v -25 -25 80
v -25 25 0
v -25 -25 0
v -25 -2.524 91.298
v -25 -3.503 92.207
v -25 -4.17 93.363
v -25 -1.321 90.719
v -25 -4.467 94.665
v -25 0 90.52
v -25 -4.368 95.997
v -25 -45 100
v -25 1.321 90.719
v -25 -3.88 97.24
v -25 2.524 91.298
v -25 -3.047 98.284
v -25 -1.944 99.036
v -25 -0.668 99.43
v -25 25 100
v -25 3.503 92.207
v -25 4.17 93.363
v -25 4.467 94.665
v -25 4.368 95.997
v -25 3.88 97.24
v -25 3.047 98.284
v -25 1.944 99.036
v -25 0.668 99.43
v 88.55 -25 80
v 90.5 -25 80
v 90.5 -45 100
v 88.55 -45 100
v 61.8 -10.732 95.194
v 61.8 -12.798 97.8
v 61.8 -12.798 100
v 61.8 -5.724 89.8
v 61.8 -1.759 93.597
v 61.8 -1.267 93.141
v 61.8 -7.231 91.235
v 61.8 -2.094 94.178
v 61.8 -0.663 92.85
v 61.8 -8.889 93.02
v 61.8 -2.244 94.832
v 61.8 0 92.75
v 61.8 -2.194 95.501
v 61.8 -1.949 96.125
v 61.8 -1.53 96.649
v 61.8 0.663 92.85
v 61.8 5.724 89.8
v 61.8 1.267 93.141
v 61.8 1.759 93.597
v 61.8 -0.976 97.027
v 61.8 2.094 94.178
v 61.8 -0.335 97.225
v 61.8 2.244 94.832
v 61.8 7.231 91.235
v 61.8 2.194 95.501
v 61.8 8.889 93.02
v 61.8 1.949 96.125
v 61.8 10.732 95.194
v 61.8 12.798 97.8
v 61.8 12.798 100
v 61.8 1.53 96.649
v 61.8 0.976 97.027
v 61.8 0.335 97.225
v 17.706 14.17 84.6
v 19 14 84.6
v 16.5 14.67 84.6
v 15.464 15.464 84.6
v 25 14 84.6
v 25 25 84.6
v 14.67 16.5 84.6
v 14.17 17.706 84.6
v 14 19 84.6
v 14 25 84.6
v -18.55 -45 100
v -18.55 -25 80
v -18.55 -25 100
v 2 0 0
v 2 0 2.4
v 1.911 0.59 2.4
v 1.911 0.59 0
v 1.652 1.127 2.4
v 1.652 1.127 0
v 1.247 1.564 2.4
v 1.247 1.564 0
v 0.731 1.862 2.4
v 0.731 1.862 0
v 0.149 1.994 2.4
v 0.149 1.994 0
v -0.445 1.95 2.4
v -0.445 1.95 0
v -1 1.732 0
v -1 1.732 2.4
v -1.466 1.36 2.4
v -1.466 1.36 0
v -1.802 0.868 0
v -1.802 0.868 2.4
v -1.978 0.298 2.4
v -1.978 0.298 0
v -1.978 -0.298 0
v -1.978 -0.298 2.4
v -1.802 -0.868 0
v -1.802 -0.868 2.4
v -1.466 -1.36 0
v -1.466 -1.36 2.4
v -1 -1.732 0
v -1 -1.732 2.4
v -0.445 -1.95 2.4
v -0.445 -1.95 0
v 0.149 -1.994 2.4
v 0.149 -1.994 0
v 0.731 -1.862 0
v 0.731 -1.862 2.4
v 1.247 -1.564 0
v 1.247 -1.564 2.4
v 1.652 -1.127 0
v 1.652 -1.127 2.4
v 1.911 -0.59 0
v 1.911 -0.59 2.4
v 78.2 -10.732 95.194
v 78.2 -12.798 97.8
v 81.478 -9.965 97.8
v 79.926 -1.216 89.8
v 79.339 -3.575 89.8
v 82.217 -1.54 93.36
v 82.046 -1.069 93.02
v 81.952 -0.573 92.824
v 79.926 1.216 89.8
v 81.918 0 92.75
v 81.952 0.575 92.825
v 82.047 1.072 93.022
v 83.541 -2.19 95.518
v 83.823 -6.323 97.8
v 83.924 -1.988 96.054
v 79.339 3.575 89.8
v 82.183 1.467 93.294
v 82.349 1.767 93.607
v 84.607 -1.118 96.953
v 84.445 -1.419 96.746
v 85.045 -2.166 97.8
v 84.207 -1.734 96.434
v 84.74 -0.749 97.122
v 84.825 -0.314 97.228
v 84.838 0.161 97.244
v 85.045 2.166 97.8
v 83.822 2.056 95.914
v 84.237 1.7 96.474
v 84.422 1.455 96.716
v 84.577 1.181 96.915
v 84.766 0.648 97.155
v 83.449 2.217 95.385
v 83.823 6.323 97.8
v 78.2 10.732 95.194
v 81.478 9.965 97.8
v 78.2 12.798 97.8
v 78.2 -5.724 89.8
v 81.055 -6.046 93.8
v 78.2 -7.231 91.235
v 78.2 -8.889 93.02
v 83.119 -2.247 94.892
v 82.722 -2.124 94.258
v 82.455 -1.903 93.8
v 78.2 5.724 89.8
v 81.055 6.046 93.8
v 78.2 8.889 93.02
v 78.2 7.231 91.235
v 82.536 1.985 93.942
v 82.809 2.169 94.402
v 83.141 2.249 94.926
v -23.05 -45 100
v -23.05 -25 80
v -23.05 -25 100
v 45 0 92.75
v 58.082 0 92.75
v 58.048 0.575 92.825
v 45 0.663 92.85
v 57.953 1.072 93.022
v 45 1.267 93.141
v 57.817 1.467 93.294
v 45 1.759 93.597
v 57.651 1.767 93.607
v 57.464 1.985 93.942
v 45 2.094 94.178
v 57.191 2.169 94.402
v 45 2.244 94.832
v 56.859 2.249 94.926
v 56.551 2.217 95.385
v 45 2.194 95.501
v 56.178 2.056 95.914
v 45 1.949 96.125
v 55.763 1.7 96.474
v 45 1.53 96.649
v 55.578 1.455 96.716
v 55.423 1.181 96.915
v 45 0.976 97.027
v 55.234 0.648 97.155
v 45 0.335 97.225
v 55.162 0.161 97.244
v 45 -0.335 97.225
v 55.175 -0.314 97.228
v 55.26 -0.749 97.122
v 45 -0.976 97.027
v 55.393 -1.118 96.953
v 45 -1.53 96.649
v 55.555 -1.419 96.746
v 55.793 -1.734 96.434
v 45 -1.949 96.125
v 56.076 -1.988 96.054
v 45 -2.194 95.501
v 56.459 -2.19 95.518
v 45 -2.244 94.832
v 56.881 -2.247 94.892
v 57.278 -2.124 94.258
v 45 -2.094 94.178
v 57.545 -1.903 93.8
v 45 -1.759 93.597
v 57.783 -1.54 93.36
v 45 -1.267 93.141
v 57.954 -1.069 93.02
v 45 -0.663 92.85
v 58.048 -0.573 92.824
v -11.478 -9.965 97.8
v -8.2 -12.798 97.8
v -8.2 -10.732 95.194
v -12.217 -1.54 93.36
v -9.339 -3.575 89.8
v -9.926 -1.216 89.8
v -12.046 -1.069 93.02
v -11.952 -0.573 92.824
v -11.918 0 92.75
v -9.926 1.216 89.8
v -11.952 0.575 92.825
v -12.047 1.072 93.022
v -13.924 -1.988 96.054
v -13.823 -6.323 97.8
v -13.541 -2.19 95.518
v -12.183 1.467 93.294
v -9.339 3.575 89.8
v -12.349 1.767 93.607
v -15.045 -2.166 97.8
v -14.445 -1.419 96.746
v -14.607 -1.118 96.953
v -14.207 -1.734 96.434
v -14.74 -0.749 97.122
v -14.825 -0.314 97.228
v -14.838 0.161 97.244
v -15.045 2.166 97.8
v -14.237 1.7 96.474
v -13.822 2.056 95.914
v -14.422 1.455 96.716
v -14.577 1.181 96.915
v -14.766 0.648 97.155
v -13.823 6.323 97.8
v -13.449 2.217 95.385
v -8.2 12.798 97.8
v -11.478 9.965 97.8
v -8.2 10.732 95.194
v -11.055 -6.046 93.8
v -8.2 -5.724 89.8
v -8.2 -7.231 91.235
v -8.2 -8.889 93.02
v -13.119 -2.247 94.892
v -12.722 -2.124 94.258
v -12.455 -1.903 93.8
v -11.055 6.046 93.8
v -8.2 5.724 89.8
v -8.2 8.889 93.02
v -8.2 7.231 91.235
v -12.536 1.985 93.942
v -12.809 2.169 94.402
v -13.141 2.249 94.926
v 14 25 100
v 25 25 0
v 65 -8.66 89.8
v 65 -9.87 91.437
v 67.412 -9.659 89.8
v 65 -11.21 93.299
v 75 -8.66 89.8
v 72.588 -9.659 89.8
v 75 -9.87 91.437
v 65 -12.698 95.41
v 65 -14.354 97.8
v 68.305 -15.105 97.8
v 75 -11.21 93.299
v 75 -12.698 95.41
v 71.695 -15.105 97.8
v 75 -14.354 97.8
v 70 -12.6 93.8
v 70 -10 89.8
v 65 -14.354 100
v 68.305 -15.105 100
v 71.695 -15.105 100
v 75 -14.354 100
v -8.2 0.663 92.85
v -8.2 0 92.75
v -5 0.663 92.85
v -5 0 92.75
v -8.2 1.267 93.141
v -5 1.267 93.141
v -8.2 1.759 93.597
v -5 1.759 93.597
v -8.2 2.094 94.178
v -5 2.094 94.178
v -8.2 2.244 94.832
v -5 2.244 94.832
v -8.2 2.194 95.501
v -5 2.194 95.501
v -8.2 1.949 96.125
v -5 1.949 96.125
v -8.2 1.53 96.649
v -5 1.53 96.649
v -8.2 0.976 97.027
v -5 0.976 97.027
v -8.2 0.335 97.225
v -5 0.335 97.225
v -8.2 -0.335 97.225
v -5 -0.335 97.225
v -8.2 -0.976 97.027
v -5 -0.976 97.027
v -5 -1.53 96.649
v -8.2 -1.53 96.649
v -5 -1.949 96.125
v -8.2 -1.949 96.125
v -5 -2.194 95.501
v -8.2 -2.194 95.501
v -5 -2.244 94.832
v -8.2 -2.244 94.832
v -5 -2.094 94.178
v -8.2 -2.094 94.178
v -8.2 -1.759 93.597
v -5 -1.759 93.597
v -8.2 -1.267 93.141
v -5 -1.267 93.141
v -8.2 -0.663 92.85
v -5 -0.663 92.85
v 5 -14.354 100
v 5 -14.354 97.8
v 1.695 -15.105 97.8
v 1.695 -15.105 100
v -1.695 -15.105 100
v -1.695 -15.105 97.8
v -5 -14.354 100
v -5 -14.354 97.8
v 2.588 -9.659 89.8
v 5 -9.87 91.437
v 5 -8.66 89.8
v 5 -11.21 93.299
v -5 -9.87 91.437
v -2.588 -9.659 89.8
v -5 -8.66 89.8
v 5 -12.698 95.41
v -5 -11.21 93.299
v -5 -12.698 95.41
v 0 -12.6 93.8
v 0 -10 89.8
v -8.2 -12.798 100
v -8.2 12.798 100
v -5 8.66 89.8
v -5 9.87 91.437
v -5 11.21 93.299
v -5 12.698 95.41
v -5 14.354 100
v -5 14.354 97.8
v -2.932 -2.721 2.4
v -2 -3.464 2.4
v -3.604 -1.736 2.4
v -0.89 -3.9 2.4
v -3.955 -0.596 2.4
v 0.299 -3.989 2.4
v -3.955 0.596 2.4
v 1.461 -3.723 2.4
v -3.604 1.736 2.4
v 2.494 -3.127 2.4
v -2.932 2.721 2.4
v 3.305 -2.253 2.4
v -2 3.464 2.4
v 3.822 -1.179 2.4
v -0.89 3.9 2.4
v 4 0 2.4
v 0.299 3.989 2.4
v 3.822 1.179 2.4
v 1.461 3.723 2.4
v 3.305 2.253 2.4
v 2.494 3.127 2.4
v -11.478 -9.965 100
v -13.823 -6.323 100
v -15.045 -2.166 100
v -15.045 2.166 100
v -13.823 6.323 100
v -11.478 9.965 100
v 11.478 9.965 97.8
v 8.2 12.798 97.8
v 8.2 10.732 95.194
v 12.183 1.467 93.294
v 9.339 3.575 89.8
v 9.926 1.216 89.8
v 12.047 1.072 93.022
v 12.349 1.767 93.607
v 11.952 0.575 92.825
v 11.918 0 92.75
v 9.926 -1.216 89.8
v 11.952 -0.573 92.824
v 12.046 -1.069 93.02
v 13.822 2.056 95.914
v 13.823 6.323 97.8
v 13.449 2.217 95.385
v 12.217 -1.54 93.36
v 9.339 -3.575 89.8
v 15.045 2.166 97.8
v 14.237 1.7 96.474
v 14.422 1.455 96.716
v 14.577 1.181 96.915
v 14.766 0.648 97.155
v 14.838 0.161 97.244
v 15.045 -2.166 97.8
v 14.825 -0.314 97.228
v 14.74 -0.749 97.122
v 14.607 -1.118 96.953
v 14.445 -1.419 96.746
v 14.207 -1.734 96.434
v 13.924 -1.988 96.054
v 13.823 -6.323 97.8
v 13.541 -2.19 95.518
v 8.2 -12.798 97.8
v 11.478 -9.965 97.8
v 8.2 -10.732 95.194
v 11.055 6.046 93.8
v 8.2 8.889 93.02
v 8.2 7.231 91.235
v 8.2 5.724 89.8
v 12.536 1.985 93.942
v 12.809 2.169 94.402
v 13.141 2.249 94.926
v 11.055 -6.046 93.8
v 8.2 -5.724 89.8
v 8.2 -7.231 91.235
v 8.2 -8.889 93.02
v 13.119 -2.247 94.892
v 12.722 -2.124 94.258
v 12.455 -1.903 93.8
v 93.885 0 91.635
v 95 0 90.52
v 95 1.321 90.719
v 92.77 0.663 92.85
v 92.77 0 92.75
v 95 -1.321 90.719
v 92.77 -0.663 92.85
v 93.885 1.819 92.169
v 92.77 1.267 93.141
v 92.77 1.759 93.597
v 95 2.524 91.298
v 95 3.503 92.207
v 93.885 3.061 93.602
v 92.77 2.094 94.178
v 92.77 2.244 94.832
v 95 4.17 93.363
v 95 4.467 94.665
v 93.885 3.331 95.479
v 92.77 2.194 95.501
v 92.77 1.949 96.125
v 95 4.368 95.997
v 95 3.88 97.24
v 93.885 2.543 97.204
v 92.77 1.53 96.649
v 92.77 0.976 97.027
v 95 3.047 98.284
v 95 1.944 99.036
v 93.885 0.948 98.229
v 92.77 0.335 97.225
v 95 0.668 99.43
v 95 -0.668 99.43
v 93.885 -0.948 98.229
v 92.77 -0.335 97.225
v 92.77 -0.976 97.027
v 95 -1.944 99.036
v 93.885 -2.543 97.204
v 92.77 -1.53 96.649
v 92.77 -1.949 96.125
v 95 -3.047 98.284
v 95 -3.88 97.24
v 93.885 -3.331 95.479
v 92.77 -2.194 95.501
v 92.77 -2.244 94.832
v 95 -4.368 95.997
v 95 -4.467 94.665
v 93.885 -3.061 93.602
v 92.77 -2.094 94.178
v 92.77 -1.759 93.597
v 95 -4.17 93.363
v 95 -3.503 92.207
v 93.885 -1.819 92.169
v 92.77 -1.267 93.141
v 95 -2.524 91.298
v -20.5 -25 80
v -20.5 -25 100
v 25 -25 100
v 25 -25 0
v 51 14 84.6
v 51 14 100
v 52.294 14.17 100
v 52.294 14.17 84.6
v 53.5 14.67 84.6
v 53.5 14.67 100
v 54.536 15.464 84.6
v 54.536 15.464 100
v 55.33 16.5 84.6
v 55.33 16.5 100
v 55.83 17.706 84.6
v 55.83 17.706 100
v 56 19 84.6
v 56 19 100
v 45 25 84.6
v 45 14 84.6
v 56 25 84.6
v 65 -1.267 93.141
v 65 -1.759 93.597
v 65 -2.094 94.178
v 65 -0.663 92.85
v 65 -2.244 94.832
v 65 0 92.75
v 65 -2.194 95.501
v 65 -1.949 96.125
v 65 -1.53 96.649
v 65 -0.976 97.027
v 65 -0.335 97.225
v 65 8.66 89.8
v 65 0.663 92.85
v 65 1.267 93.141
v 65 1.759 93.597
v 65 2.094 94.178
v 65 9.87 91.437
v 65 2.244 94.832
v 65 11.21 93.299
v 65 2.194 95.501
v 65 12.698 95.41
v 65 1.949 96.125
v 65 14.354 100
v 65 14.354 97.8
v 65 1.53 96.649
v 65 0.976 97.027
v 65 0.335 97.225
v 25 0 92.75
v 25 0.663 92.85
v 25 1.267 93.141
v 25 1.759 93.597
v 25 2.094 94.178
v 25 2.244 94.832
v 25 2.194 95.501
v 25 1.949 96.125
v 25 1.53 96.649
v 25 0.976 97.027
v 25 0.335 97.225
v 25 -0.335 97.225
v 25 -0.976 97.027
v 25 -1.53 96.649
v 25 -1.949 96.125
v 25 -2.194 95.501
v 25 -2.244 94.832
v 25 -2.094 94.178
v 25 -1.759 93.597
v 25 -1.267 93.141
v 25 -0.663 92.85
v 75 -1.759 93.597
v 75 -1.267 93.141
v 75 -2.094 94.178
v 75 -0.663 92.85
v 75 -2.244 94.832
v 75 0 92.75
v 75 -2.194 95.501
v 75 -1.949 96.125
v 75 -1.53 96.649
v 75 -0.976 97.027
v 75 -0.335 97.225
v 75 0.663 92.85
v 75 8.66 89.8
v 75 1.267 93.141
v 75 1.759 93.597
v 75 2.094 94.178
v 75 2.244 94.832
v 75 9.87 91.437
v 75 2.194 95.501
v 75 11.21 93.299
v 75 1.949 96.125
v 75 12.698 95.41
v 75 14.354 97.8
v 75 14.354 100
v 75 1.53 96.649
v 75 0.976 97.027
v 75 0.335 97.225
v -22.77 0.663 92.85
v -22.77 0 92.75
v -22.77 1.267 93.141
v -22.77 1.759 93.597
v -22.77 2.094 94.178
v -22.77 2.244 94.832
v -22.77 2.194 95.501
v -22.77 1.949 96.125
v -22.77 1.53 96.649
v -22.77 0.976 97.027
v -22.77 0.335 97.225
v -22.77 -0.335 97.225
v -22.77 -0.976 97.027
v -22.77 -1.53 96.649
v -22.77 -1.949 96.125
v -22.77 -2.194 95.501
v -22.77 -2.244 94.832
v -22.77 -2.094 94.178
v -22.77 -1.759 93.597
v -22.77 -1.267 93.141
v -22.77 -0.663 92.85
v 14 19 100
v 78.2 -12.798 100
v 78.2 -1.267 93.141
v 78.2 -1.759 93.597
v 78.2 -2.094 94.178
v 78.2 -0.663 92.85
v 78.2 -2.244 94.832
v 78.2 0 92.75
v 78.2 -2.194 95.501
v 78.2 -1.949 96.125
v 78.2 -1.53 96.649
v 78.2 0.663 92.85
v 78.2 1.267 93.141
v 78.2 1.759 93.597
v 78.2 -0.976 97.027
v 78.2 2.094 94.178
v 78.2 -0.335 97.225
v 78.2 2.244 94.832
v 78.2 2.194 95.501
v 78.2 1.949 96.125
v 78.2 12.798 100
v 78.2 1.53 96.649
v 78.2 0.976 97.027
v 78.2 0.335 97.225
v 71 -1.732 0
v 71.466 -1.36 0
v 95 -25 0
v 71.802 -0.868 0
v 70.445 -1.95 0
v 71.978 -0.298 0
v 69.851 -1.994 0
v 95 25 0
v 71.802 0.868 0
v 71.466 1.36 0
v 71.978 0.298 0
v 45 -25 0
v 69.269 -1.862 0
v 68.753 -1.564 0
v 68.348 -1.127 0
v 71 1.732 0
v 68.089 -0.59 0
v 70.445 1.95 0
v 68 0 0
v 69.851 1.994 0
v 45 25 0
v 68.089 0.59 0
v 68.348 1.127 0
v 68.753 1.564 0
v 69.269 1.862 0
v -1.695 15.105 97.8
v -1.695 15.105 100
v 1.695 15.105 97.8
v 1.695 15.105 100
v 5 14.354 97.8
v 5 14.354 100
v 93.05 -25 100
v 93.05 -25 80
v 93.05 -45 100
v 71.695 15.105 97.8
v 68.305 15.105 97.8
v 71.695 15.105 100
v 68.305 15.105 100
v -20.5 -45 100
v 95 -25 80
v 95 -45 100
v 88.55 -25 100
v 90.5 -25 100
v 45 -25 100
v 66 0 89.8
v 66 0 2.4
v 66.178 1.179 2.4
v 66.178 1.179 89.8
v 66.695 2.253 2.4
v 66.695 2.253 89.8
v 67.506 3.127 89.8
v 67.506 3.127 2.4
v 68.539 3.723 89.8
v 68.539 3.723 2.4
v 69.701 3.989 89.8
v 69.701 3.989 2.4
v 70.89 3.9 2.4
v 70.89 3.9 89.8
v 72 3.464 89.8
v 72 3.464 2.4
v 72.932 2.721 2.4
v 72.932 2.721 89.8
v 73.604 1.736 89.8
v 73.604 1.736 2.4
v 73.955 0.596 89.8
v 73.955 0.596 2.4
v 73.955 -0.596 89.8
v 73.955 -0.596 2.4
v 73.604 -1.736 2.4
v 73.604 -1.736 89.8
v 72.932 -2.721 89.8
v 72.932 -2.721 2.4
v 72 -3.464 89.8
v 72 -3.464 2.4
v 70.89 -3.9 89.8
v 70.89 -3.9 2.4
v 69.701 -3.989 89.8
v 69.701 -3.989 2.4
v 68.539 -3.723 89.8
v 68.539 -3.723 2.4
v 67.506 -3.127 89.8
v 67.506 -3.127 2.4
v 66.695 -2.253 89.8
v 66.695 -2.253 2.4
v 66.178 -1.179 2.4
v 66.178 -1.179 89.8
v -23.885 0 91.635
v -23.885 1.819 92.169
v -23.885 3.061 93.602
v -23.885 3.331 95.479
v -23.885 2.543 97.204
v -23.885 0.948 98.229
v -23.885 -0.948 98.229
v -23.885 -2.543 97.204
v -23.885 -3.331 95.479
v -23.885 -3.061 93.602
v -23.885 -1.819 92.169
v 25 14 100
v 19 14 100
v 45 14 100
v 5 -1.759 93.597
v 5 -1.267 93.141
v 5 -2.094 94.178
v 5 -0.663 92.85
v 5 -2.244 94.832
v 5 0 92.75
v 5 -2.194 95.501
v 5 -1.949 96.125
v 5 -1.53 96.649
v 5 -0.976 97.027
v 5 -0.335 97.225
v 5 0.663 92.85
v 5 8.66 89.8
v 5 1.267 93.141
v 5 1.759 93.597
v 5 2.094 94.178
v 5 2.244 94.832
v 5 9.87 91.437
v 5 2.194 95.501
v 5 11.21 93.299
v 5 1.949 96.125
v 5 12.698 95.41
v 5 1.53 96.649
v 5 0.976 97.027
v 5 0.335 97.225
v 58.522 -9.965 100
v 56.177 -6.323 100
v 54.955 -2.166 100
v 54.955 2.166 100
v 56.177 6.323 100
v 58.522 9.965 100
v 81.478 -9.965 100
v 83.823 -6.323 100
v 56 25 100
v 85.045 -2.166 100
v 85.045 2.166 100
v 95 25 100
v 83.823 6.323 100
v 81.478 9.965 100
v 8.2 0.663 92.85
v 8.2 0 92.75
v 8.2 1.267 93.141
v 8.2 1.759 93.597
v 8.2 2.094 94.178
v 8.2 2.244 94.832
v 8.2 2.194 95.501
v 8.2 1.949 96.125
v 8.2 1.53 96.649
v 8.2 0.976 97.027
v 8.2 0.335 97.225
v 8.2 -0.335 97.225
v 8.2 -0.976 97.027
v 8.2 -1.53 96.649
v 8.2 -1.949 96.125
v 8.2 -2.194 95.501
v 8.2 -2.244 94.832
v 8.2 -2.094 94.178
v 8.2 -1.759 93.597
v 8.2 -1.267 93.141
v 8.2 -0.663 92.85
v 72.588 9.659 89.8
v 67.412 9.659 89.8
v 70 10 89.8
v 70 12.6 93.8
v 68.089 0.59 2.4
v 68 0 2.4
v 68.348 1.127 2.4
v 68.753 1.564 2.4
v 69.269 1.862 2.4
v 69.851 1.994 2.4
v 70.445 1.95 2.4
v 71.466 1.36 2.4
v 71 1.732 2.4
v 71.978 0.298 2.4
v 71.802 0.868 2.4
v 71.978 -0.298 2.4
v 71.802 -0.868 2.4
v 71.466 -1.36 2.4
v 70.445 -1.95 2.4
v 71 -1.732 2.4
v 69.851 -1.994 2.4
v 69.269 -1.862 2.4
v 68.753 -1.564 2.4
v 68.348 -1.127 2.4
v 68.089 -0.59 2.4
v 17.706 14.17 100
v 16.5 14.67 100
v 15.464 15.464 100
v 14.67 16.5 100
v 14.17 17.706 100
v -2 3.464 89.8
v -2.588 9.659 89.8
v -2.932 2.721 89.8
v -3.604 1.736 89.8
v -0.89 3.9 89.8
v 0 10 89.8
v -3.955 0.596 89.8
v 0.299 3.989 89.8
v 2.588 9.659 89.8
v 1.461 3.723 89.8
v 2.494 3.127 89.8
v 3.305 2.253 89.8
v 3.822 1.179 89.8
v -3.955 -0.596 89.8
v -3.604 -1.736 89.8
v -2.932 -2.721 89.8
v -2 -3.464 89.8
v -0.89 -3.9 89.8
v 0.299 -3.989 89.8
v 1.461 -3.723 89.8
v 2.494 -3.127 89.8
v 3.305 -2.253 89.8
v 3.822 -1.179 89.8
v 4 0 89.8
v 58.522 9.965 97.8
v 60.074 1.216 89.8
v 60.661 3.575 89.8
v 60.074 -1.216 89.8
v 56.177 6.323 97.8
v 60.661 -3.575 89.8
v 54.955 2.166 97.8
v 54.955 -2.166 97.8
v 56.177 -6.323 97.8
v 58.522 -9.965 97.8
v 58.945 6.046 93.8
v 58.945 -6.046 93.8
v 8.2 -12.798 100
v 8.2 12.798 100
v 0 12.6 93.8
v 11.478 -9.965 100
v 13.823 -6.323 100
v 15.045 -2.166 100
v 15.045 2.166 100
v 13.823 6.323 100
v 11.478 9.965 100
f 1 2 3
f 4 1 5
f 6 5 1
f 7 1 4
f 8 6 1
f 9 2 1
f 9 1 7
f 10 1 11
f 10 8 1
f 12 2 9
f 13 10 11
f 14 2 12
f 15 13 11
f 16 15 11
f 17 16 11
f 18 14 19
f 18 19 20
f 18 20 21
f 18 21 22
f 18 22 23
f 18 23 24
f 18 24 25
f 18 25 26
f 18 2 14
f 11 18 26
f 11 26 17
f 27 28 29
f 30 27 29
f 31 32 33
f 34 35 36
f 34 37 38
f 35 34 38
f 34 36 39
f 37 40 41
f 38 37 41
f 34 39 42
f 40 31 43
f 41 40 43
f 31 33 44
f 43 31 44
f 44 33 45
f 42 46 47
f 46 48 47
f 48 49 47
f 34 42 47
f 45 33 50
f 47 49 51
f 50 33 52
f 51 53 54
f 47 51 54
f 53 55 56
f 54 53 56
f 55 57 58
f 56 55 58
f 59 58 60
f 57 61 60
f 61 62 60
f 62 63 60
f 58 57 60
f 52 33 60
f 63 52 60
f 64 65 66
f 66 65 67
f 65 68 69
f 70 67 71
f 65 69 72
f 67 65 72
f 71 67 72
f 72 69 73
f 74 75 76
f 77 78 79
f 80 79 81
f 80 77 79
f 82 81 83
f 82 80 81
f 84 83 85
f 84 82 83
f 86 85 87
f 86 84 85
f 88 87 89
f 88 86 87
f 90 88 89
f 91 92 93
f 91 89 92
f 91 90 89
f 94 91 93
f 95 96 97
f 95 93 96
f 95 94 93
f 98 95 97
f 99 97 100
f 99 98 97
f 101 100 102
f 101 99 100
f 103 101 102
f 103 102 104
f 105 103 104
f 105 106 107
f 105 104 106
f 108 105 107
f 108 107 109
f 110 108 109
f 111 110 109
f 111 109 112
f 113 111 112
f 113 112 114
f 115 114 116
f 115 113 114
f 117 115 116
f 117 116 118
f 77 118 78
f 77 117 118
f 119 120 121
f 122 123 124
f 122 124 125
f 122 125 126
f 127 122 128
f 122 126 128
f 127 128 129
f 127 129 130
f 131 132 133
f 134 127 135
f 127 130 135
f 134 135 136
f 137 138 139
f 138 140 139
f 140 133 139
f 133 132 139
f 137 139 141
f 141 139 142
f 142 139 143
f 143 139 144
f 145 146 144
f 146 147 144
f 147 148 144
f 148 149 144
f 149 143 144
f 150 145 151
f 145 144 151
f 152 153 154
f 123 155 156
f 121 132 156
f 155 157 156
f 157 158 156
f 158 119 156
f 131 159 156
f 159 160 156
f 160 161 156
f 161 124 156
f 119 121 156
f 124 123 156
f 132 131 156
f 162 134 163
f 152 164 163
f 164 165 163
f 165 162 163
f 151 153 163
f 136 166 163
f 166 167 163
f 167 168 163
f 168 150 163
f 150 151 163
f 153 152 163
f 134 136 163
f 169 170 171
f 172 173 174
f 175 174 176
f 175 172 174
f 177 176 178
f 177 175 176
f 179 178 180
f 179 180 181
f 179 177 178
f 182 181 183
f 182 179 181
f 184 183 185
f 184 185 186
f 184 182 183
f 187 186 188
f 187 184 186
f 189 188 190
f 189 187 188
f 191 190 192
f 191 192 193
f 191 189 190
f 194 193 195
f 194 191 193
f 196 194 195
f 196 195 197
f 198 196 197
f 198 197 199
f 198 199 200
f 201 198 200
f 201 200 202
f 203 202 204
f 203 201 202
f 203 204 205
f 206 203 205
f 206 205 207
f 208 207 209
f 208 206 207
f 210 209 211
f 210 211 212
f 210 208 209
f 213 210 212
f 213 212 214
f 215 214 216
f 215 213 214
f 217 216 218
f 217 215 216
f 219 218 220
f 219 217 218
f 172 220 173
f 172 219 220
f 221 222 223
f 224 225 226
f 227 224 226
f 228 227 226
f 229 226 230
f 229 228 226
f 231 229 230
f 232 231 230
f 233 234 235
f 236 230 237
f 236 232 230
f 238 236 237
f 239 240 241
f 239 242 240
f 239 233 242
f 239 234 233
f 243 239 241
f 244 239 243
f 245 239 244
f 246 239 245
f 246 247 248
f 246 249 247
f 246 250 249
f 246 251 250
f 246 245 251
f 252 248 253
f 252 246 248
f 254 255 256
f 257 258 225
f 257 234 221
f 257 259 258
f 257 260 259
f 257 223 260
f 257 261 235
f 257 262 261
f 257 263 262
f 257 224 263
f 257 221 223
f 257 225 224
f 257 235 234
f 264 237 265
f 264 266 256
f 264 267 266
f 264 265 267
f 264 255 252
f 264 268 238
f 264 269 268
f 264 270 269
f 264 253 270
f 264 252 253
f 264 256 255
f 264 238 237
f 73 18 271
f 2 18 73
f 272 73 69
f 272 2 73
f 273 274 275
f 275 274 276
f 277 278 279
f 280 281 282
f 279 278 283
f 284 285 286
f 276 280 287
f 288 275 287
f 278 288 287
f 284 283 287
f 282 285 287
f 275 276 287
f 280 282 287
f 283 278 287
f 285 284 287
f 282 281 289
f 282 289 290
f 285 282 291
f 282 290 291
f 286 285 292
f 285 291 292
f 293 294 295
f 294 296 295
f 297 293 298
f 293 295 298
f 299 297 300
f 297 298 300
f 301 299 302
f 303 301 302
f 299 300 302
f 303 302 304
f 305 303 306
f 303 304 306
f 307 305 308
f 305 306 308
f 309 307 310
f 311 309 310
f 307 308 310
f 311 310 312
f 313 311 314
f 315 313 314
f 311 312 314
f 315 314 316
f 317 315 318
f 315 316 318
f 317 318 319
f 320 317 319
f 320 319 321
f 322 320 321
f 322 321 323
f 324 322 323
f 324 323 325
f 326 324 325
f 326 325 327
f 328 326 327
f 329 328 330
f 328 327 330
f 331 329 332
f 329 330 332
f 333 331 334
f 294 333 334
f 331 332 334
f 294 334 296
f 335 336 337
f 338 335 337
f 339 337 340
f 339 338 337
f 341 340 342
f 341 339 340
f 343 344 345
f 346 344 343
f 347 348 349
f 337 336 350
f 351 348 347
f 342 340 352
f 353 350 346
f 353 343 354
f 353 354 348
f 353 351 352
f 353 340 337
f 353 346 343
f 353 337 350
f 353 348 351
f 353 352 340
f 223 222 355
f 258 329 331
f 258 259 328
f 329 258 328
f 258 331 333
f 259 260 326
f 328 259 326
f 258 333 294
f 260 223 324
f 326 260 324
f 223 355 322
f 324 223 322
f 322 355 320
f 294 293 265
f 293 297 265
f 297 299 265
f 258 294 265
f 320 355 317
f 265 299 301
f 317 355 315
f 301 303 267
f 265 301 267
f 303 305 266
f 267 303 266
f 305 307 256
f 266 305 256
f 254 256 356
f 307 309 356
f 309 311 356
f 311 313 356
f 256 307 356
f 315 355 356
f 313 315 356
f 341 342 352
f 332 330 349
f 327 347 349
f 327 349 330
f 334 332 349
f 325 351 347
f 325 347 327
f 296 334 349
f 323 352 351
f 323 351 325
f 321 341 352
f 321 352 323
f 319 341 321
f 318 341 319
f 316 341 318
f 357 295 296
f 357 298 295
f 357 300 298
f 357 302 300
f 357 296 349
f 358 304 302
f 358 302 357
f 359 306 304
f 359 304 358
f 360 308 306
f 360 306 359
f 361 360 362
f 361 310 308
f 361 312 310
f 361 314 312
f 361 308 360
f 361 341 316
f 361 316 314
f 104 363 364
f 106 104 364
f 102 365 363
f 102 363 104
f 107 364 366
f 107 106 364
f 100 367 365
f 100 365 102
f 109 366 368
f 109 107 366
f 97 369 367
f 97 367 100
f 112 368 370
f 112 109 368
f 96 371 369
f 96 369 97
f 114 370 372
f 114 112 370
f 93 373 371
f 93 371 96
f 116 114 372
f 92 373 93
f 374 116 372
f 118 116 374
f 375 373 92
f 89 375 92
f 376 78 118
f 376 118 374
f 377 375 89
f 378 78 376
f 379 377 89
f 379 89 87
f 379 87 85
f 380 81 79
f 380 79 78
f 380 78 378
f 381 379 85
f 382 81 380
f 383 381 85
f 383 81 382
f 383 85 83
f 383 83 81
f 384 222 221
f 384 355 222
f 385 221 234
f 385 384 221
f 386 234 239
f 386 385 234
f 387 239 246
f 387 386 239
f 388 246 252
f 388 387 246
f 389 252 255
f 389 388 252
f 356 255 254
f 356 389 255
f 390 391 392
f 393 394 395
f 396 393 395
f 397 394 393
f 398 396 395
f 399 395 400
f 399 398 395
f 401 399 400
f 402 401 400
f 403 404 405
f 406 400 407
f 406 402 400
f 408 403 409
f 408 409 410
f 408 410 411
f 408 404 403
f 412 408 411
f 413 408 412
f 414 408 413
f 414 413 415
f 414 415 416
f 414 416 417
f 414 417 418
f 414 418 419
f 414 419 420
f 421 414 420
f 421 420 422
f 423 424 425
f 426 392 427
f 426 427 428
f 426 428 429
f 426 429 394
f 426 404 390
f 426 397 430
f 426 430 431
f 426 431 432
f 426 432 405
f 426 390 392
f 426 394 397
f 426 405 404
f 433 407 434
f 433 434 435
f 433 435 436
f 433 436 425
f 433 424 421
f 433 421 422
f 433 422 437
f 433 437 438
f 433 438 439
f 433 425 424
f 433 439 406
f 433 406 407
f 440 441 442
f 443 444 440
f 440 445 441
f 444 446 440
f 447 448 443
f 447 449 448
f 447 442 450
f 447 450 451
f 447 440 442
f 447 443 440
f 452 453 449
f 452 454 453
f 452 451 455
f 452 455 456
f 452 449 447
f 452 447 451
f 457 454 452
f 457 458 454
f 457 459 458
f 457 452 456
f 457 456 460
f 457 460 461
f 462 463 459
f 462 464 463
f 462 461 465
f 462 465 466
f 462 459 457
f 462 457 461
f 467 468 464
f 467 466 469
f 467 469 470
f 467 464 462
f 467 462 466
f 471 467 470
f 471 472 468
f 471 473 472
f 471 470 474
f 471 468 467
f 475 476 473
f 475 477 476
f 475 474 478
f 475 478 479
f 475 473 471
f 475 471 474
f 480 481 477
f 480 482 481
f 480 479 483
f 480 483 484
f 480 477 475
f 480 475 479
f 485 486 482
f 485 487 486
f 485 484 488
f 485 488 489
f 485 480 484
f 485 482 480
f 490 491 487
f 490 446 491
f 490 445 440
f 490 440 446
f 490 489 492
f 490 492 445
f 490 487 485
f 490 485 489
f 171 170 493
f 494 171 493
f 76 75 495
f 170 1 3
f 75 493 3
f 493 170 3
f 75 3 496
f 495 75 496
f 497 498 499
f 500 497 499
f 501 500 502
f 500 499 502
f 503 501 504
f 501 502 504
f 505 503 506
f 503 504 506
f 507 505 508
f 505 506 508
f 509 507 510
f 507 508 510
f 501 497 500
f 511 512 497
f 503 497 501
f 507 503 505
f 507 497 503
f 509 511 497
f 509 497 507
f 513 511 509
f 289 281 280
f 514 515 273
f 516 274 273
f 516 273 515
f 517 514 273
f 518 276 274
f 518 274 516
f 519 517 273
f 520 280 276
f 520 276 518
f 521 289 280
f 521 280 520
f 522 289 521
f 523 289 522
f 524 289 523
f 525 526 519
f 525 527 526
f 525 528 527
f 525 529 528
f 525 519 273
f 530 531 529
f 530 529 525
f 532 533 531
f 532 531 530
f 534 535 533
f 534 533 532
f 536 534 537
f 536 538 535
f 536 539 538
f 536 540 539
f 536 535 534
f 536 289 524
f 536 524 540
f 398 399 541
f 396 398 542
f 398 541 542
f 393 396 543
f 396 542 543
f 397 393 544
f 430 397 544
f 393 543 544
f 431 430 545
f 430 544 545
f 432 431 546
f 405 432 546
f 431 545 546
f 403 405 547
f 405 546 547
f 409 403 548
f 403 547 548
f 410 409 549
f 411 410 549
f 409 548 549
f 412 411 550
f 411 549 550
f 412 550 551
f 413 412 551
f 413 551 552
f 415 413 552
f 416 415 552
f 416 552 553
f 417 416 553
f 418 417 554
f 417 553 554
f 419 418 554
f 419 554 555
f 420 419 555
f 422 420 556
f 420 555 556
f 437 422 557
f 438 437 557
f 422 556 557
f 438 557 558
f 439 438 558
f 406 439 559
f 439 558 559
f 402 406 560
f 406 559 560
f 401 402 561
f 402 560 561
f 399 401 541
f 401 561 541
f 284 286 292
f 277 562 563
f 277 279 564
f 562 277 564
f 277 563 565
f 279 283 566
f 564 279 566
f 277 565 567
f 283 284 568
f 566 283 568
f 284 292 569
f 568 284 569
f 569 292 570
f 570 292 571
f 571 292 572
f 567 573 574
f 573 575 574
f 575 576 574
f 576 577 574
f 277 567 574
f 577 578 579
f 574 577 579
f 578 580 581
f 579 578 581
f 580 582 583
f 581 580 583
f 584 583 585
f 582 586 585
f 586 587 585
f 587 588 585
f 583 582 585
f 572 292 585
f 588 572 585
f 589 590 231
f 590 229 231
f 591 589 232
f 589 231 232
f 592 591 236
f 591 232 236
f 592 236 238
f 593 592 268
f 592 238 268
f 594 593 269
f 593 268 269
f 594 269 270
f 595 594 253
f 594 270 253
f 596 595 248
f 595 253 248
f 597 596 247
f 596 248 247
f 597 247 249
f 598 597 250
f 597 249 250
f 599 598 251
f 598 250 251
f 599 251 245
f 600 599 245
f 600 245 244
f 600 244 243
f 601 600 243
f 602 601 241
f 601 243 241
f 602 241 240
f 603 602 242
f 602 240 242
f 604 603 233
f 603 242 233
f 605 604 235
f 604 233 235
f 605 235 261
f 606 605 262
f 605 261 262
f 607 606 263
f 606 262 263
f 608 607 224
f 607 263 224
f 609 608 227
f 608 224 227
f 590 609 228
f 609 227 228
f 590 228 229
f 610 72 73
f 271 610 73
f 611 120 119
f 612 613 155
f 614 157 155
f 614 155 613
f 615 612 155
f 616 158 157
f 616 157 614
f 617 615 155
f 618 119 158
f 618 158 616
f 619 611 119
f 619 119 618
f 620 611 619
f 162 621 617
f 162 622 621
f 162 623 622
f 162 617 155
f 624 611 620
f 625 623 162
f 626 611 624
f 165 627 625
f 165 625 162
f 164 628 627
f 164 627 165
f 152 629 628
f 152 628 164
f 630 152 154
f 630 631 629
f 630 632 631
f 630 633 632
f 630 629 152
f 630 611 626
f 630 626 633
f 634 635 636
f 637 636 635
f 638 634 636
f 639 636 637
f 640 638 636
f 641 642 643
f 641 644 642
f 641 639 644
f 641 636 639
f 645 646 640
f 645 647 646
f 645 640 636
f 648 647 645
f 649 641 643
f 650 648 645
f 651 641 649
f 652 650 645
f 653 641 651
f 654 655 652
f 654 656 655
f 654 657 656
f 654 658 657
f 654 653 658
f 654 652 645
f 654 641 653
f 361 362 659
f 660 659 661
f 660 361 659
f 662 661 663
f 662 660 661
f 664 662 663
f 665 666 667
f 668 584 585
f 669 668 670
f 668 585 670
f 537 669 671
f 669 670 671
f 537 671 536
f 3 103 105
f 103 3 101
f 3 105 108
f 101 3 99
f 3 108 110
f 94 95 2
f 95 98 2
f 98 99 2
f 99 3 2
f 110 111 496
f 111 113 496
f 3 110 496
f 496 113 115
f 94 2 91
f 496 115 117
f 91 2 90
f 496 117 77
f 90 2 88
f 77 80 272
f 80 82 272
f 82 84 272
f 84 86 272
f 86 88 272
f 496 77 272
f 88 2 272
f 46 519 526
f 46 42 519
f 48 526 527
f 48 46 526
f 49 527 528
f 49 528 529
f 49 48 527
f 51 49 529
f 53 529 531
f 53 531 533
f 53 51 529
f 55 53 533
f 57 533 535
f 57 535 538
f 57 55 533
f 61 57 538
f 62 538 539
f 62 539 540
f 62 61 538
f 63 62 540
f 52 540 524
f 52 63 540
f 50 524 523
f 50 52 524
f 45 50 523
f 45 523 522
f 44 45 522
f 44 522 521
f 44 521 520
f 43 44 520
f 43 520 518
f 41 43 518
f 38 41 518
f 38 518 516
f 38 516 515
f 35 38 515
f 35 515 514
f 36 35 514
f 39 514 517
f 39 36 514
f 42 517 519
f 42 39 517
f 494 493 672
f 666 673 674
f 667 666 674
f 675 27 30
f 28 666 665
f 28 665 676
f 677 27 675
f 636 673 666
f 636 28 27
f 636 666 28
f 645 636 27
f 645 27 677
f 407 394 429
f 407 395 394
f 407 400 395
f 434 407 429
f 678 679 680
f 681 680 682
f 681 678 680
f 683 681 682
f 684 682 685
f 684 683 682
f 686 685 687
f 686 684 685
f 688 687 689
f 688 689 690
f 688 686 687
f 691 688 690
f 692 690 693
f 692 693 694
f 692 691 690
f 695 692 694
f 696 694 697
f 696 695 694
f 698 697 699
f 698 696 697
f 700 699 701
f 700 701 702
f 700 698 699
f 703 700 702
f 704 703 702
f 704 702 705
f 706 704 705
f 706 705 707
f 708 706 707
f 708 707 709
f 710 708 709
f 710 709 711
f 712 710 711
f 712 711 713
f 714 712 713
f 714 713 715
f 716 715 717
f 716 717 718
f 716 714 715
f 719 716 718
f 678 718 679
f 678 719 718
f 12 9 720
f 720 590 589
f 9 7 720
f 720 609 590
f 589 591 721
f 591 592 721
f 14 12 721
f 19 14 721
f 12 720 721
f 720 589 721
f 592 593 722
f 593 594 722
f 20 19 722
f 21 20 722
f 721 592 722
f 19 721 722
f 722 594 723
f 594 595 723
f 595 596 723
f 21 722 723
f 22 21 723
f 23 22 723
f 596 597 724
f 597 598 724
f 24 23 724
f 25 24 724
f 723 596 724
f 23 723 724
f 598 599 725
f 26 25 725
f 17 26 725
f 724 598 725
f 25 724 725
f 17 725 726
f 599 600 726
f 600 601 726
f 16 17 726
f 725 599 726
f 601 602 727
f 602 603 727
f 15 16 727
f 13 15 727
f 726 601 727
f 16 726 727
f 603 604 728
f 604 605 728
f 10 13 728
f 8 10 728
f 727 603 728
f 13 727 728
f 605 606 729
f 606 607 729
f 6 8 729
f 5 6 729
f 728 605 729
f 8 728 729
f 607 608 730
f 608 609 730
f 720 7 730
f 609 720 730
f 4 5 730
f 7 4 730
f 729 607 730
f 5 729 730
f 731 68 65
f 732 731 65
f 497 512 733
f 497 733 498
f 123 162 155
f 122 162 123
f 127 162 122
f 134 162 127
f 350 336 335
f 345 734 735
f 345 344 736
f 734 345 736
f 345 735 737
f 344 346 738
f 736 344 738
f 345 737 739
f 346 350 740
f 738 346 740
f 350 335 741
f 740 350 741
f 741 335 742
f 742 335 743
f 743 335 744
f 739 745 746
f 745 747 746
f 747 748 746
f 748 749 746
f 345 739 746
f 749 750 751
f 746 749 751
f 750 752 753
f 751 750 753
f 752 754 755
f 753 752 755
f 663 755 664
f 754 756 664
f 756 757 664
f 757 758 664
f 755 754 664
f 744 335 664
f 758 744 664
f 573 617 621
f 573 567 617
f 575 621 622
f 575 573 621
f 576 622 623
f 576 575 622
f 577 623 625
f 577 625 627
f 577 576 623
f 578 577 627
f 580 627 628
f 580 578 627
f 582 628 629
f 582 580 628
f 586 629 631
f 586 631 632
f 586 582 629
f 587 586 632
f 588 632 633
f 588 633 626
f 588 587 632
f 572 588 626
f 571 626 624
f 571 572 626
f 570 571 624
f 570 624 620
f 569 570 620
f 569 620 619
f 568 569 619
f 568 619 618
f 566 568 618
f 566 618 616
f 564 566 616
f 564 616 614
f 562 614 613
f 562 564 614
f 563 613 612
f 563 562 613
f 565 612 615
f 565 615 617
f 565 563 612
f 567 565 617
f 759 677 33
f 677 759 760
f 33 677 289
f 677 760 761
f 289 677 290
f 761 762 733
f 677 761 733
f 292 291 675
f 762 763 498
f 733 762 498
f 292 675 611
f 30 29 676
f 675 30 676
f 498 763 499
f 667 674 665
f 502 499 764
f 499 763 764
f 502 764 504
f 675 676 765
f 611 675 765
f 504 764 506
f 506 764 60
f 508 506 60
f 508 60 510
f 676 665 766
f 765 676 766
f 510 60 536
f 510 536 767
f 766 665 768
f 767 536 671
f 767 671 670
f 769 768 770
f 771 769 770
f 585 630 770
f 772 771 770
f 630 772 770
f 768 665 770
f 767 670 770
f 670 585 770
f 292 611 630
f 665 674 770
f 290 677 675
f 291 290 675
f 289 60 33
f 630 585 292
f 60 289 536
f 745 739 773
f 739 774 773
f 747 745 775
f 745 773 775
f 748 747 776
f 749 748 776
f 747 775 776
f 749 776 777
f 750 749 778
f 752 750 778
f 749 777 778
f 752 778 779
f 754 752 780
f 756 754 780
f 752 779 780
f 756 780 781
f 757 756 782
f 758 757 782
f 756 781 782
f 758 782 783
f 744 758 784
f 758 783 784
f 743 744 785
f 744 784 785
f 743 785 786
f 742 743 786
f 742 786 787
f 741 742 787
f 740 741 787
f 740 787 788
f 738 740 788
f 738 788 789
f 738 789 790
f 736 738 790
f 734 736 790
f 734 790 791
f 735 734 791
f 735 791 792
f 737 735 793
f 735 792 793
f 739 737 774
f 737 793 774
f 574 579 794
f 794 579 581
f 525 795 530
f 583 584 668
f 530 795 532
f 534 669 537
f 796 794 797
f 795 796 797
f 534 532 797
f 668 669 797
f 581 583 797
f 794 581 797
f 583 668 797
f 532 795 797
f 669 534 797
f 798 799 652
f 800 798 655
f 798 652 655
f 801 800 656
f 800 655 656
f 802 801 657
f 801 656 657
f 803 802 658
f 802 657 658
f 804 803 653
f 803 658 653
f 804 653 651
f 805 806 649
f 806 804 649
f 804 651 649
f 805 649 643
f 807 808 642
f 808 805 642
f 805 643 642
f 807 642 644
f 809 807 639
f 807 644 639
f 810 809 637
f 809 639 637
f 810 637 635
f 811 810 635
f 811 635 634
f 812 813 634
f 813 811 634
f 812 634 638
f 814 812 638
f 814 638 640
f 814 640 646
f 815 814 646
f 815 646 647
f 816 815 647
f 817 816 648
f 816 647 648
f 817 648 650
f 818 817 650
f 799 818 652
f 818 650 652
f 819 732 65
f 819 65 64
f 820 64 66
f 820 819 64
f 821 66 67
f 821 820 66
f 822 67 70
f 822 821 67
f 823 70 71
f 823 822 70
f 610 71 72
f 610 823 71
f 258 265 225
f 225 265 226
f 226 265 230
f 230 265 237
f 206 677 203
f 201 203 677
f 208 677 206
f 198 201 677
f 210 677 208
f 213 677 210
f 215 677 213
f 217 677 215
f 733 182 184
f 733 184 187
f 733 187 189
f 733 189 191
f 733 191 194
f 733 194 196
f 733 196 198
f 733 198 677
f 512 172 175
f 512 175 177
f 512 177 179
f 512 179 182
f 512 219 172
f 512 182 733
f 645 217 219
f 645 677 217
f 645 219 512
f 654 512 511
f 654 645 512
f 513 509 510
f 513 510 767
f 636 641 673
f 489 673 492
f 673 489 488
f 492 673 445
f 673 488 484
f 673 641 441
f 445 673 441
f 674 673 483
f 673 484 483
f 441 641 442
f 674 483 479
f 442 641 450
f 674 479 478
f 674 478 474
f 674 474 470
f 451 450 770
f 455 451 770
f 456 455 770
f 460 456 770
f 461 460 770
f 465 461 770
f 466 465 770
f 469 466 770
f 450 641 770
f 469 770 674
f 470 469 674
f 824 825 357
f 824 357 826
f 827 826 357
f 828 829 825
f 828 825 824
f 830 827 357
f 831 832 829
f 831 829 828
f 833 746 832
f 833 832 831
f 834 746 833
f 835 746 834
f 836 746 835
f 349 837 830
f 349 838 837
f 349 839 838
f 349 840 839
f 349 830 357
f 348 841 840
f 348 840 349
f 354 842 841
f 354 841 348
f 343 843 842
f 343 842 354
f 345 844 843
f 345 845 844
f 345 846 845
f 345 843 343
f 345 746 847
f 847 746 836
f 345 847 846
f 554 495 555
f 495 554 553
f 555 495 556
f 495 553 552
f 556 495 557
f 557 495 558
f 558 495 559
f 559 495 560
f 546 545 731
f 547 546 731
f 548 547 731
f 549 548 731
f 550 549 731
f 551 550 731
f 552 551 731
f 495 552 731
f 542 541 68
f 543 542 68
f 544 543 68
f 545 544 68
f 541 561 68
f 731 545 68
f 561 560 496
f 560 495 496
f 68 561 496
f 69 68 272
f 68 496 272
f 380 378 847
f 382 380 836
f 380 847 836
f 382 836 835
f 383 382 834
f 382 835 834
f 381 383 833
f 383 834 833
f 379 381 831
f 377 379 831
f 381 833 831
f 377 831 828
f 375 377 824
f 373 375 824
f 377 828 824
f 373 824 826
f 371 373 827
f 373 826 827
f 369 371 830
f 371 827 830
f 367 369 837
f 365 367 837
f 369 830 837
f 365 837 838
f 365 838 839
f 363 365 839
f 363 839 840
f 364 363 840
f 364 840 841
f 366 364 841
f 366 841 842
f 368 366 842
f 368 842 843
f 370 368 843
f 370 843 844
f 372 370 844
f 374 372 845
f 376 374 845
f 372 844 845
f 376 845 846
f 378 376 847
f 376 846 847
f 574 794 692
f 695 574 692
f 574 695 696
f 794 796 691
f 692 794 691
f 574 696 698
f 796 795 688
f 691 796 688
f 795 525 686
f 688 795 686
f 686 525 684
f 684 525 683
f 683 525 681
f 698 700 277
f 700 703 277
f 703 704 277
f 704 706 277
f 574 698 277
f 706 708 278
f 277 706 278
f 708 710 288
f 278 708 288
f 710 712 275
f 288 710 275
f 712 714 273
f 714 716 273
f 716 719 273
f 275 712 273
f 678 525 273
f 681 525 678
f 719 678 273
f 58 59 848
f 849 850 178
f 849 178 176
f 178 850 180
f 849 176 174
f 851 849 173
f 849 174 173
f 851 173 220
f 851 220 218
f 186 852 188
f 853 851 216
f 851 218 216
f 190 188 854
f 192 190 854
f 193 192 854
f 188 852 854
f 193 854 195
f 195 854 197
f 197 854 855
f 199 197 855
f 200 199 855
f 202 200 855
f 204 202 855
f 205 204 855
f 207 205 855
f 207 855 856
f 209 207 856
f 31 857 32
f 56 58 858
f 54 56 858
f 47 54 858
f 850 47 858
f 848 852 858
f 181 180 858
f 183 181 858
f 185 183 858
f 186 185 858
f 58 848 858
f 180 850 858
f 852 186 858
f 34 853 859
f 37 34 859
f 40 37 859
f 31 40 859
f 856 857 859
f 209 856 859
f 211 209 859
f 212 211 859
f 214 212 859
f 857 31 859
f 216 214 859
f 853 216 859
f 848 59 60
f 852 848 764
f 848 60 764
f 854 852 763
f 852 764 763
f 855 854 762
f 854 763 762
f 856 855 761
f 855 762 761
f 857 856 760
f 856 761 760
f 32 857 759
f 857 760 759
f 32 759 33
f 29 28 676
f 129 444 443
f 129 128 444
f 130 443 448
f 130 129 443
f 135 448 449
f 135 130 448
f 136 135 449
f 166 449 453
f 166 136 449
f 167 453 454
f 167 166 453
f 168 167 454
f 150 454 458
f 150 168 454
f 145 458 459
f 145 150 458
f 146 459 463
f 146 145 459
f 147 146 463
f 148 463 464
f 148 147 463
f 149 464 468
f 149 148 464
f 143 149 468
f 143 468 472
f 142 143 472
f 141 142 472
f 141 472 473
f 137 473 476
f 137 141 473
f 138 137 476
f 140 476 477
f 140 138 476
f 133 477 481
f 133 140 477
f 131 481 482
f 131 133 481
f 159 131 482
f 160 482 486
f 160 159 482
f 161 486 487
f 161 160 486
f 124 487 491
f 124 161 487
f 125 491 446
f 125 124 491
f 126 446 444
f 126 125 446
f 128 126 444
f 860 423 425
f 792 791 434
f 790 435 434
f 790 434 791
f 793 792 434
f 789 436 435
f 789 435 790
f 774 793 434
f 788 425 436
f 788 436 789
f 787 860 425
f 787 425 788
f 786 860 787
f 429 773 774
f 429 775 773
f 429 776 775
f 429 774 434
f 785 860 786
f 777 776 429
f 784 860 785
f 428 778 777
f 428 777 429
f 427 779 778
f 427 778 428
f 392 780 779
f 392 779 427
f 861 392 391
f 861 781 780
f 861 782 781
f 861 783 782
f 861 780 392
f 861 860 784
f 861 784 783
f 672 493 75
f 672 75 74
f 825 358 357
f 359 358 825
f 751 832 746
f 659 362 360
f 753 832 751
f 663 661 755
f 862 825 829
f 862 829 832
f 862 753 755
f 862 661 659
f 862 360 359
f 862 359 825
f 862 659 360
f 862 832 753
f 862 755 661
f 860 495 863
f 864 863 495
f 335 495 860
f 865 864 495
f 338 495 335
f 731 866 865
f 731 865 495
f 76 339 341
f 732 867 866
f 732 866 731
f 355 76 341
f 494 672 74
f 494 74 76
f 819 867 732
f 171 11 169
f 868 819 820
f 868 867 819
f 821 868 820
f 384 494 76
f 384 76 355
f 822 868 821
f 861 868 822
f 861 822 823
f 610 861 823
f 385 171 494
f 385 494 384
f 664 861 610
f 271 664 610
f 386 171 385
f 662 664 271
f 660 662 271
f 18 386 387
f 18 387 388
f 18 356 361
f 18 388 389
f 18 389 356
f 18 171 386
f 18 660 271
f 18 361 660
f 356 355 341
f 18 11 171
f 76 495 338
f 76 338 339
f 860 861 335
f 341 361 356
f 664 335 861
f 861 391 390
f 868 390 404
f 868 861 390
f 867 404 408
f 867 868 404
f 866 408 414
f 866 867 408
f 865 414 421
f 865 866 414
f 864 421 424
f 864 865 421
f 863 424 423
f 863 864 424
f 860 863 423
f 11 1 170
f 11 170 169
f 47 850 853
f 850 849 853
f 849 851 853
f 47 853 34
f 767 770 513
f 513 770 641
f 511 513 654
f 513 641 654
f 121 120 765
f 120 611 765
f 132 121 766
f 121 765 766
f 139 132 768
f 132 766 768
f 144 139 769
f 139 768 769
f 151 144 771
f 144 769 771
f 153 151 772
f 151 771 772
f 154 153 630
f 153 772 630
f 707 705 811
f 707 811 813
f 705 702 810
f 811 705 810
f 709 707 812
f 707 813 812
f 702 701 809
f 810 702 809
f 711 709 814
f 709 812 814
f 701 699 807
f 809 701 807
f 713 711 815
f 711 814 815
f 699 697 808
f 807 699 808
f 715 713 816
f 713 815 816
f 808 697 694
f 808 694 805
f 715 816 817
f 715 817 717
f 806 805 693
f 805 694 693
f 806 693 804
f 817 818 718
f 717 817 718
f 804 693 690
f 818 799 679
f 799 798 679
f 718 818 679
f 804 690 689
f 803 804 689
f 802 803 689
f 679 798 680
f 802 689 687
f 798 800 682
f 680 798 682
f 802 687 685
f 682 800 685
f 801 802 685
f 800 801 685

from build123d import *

# Parameters (mm, degrees)
CROQUIS1_W                                           = 50
CROQUIS1_H                                           = 50
CROQUIS1_R                                           = 2
SALIENTE_EXTRUIR2_DEPTH                              = 100
CROQUIS4_W                                           = 3.2
CROQUIS4_H                                           = 40
SALIENTE_EXTRUIR5_DEPTH                              = 10.2
CROQUIS8_R                                           = 4
CORTAR_EXTRUIR3_DEPTH                                = 87.4
CORTAR_EXTRUIR2_START                                = -50
CROQUIS7_R                                           = 2
CORTAR_EXTRUIR2_DEPTH                                = 50
REFRENTADO_PARA_TORNILLO_TAP_N_CON_CABEZ_D           = 4.5
REFRENTADO_PARA_TORNILLO_TAP_N_CON_CABEZ_CSINK_D     = 8.96
REFRENTADO_PARA_TORNILLO_TAP_N_CON_CABEZ_CSINK_ANGLE = 90
SALIENTE_EXTRUIR6_DEPTH                              = 1.95
SALIENTE_EXTRUIR7_START                              = -4.5
SALIENTE_EXTRUIR7_DEPTH                              = 1.95
CORTAR_EXTRUIR4_DEPTH                                = 15.4


with BuildPart() as part:
    # Croquis1 → Saliente-Extruir2 (new body)
    with BuildSketch(Plane.XY):
        Rectangle(CROQUIS1_W, CROQUIS1_H)
        Circle(CROQUIS1_R, mode=Mode.SUBTRACT)
    extrude(amount=SALIENTE_EXTRUIR2_DEPTH)

    # Croquis2 → Cortar-Revolución1 (revolve, cut)
    with BuildSketch(Plane(origin=(0, 0, 0), x_dir=(0, 0, -1), z_dir=(1, 0, 0))):
        Polygon((-100, 15.2), (-100, 0), (-89.8, 0), (-89.8, 10), (-97.8, 15.2), align=None)
    revolve(axis=Axis((0, 0, 100), (0, 0, -1)), mode=Mode.SUBTRACT)

    # Croquis4 → Saliente-Extruir5 (add)
    with BuildSketch(Plane.XY.offset(100)):
        with Locations((-6.6, 0)):
            Rectangle(CROQUIS4_W, CROQUIS4_H)
        with Locations((6.6, 0)):
            Rectangle(CROQUIS4_W, CROQUIS4_H)
    extrude(amount=-SALIENTE_EXTRUIR5_DEPTH)

    # Croquis8 → Cortar-Extruir3 (cut)
    with BuildSketch(Plane.XY.offset(89.8)):
        Circle(CROQUIS8_R)
    extrude(amount=-CORTAR_EXTRUIR3_DEPTH, mode=Mode.SUBTRACT)

    # Croquis7 → Cortar-Extruir2 (cut)
    with BuildSketch(Plane.ZY.offset(25).offset(CORTAR_EXTRUIR2_START)):
        with Locations((95, 0)):
            Circle(CROQUIS7_R)
    extrude(amount=CORTAR_EXTRUIR2_DEPTH, mode=Mode.SUBTRACT)

    # Refrentado para tornillo tapón con cabeza plana de clavija de M41 (through all)
    with Locations(Plane.ZY.offset(25)):
        with Locations((95, 0)):
            CounterSinkHole(REFRENTADO_PARA_TORNILLO_TAP_N_CON_CABEZ_D / 2, REFRENTADO_PARA_TORNILLO_TAP_N_CON_CABEZ_CSINK_D / 2, counter_sink_angle=REFRENTADO_PARA_TORNILLO_TAP_N_CON_CABEZ_CSINK_ANGLE)

    # Croquis12 → Saliente-Extruir6 (add)
    with BuildSketch(Plane.ZY.offset(25)):
        Polygon((100, -25), (80, -25), (100, -45), align=None)
    extrude(amount=-SALIENTE_EXTRUIR6_DEPTH)

    # Croquis12<2> → Saliente-Extruir7 (add)
    with BuildSketch(Plane.ZY.offset(25).offset(SALIENTE_EXTRUIR7_START)):
        Polygon((100, -25), (80, -25), (100, -45), align=None)
    extrude(amount=-SALIENTE_EXTRUIR7_DEPTH)

    # Croquis13 → Cortar-Extruir4 (cut)
    with BuildSketch(Plane.XY.offset(100)):
        with BuildLine():
            Line((25, 25), (25, 14))
            Line((25, 14), (19, 14))
            ThreePointArc((19, 14), (15.464466094, 15.464466094), (14, 19))
            Line((14, 19), (14, 25))
            Line((14, 25), (25, 25))
        make_face()
    extrude(amount=-CORTAR_EXTRUIR4_DEPTH, mode=Mode.SUBTRACT)


with BuildPart() as body_2:
    # Simetría3: mirrored copy
    add(part.part.mirror(Plane(origin=(35, 0, 0), x_dir=(0, 0, 1), z_dir=(1, 0, 0))))


solid = Compound([part.part, body_2.part])
